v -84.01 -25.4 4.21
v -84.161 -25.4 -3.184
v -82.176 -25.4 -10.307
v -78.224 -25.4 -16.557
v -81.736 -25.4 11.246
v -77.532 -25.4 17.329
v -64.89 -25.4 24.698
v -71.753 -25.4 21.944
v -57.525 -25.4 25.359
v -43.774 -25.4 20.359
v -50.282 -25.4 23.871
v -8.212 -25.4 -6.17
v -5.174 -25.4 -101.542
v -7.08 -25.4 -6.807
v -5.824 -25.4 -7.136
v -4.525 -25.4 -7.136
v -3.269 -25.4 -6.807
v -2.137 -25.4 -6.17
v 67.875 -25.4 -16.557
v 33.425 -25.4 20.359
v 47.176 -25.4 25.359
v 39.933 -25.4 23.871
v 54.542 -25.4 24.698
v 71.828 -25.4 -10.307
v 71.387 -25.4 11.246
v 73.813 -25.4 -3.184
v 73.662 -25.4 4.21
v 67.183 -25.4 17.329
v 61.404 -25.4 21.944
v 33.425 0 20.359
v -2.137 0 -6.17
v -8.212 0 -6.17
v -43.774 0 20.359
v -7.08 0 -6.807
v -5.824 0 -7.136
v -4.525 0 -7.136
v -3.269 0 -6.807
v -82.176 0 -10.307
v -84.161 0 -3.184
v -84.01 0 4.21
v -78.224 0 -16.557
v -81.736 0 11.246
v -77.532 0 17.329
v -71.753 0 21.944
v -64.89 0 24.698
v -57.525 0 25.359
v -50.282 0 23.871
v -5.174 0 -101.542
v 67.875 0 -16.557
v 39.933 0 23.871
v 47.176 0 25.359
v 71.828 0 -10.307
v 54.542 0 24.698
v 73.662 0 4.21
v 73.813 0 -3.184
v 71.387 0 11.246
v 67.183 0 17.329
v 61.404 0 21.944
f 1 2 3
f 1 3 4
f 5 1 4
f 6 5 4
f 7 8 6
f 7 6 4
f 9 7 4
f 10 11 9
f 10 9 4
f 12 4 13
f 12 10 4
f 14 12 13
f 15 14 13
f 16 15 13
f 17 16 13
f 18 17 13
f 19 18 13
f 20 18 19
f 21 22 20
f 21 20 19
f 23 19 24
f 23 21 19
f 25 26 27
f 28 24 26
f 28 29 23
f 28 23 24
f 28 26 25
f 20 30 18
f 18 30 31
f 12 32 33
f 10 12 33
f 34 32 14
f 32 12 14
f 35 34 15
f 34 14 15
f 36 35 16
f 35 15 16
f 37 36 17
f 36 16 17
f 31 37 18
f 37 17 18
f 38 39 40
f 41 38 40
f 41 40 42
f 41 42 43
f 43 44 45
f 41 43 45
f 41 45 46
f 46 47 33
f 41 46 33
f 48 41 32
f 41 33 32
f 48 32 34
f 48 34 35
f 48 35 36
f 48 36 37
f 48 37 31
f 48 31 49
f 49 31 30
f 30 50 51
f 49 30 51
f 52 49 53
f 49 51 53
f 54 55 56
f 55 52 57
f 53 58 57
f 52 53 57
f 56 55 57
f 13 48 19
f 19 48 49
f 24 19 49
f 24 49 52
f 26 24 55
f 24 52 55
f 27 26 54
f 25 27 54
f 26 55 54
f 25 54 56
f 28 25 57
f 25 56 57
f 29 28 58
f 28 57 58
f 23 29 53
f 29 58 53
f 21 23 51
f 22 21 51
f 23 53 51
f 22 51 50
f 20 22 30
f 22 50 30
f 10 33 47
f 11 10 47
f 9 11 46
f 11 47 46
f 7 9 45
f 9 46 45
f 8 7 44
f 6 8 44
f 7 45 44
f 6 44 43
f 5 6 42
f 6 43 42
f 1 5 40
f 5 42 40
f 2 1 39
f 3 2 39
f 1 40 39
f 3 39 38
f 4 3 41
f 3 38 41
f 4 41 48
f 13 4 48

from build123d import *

# Parameters (mm, degrees)
F1_DEPTH = 25.4
F2_DEPTH = 25.4
F3_R     = 5.08


with BuildPart() as f1:
    # F0 (on Front) → F1 (new body)
    with BuildSketch(Plane.XZ):
        with BuildLine():
            Line((-5.174372, -8.435566), (-43.773927, 20.35916))
            ThreePointArc((-43.773927, 20.35916), (-77.531681, 17.329487), (-78.223706, -16.556881))
            Line((-78.223706, -16.556881), (-5.174372, -101.541841))
            Line((-5.174372, -101.541841), (67.874961, -16.556881))
            ThreePointArc((67.874961, -16.556881), (67.182936, 17.329487), (33.425183, 20.35916))
            Line((33.425183, 20.35916), (-5.174372, -8.435566))
        make_face()
    extrude(amount=F1_DEPTH)

    # F0 (on Front) → F2 (join)
    with BuildSketch(Plane.XZ):
        with BuildLine():
            Line((-5.174372, -8.435566), (-43.773927, 20.35916))
            ThreePointArc((-43.773927, 20.35916), (-77.531681, 17.329487), (-78.223706, -16.556881))
            Line((-78.223706, -16.556881), (-5.174372, -101.541841))
            Line((-5.174372, -101.541841), (67.874961, -16.556881))
            ThreePointArc((67.874961, -16.556881), (67.182936, 17.329487), (33.425183, 20.35916))
            Line((33.425183, 20.35916), (-5.174372, -8.435566))
        make_face()
    extrude(amount=F2_DEPTH)

    # F3
    f3_edges = [f1.edges().sort_by_distance(p)[0] for p in [
        (-5.174372, -12.7, -8.435566),
    ]]
    fillet(f3_edges, radius=F3_R)


solid = f1.part
